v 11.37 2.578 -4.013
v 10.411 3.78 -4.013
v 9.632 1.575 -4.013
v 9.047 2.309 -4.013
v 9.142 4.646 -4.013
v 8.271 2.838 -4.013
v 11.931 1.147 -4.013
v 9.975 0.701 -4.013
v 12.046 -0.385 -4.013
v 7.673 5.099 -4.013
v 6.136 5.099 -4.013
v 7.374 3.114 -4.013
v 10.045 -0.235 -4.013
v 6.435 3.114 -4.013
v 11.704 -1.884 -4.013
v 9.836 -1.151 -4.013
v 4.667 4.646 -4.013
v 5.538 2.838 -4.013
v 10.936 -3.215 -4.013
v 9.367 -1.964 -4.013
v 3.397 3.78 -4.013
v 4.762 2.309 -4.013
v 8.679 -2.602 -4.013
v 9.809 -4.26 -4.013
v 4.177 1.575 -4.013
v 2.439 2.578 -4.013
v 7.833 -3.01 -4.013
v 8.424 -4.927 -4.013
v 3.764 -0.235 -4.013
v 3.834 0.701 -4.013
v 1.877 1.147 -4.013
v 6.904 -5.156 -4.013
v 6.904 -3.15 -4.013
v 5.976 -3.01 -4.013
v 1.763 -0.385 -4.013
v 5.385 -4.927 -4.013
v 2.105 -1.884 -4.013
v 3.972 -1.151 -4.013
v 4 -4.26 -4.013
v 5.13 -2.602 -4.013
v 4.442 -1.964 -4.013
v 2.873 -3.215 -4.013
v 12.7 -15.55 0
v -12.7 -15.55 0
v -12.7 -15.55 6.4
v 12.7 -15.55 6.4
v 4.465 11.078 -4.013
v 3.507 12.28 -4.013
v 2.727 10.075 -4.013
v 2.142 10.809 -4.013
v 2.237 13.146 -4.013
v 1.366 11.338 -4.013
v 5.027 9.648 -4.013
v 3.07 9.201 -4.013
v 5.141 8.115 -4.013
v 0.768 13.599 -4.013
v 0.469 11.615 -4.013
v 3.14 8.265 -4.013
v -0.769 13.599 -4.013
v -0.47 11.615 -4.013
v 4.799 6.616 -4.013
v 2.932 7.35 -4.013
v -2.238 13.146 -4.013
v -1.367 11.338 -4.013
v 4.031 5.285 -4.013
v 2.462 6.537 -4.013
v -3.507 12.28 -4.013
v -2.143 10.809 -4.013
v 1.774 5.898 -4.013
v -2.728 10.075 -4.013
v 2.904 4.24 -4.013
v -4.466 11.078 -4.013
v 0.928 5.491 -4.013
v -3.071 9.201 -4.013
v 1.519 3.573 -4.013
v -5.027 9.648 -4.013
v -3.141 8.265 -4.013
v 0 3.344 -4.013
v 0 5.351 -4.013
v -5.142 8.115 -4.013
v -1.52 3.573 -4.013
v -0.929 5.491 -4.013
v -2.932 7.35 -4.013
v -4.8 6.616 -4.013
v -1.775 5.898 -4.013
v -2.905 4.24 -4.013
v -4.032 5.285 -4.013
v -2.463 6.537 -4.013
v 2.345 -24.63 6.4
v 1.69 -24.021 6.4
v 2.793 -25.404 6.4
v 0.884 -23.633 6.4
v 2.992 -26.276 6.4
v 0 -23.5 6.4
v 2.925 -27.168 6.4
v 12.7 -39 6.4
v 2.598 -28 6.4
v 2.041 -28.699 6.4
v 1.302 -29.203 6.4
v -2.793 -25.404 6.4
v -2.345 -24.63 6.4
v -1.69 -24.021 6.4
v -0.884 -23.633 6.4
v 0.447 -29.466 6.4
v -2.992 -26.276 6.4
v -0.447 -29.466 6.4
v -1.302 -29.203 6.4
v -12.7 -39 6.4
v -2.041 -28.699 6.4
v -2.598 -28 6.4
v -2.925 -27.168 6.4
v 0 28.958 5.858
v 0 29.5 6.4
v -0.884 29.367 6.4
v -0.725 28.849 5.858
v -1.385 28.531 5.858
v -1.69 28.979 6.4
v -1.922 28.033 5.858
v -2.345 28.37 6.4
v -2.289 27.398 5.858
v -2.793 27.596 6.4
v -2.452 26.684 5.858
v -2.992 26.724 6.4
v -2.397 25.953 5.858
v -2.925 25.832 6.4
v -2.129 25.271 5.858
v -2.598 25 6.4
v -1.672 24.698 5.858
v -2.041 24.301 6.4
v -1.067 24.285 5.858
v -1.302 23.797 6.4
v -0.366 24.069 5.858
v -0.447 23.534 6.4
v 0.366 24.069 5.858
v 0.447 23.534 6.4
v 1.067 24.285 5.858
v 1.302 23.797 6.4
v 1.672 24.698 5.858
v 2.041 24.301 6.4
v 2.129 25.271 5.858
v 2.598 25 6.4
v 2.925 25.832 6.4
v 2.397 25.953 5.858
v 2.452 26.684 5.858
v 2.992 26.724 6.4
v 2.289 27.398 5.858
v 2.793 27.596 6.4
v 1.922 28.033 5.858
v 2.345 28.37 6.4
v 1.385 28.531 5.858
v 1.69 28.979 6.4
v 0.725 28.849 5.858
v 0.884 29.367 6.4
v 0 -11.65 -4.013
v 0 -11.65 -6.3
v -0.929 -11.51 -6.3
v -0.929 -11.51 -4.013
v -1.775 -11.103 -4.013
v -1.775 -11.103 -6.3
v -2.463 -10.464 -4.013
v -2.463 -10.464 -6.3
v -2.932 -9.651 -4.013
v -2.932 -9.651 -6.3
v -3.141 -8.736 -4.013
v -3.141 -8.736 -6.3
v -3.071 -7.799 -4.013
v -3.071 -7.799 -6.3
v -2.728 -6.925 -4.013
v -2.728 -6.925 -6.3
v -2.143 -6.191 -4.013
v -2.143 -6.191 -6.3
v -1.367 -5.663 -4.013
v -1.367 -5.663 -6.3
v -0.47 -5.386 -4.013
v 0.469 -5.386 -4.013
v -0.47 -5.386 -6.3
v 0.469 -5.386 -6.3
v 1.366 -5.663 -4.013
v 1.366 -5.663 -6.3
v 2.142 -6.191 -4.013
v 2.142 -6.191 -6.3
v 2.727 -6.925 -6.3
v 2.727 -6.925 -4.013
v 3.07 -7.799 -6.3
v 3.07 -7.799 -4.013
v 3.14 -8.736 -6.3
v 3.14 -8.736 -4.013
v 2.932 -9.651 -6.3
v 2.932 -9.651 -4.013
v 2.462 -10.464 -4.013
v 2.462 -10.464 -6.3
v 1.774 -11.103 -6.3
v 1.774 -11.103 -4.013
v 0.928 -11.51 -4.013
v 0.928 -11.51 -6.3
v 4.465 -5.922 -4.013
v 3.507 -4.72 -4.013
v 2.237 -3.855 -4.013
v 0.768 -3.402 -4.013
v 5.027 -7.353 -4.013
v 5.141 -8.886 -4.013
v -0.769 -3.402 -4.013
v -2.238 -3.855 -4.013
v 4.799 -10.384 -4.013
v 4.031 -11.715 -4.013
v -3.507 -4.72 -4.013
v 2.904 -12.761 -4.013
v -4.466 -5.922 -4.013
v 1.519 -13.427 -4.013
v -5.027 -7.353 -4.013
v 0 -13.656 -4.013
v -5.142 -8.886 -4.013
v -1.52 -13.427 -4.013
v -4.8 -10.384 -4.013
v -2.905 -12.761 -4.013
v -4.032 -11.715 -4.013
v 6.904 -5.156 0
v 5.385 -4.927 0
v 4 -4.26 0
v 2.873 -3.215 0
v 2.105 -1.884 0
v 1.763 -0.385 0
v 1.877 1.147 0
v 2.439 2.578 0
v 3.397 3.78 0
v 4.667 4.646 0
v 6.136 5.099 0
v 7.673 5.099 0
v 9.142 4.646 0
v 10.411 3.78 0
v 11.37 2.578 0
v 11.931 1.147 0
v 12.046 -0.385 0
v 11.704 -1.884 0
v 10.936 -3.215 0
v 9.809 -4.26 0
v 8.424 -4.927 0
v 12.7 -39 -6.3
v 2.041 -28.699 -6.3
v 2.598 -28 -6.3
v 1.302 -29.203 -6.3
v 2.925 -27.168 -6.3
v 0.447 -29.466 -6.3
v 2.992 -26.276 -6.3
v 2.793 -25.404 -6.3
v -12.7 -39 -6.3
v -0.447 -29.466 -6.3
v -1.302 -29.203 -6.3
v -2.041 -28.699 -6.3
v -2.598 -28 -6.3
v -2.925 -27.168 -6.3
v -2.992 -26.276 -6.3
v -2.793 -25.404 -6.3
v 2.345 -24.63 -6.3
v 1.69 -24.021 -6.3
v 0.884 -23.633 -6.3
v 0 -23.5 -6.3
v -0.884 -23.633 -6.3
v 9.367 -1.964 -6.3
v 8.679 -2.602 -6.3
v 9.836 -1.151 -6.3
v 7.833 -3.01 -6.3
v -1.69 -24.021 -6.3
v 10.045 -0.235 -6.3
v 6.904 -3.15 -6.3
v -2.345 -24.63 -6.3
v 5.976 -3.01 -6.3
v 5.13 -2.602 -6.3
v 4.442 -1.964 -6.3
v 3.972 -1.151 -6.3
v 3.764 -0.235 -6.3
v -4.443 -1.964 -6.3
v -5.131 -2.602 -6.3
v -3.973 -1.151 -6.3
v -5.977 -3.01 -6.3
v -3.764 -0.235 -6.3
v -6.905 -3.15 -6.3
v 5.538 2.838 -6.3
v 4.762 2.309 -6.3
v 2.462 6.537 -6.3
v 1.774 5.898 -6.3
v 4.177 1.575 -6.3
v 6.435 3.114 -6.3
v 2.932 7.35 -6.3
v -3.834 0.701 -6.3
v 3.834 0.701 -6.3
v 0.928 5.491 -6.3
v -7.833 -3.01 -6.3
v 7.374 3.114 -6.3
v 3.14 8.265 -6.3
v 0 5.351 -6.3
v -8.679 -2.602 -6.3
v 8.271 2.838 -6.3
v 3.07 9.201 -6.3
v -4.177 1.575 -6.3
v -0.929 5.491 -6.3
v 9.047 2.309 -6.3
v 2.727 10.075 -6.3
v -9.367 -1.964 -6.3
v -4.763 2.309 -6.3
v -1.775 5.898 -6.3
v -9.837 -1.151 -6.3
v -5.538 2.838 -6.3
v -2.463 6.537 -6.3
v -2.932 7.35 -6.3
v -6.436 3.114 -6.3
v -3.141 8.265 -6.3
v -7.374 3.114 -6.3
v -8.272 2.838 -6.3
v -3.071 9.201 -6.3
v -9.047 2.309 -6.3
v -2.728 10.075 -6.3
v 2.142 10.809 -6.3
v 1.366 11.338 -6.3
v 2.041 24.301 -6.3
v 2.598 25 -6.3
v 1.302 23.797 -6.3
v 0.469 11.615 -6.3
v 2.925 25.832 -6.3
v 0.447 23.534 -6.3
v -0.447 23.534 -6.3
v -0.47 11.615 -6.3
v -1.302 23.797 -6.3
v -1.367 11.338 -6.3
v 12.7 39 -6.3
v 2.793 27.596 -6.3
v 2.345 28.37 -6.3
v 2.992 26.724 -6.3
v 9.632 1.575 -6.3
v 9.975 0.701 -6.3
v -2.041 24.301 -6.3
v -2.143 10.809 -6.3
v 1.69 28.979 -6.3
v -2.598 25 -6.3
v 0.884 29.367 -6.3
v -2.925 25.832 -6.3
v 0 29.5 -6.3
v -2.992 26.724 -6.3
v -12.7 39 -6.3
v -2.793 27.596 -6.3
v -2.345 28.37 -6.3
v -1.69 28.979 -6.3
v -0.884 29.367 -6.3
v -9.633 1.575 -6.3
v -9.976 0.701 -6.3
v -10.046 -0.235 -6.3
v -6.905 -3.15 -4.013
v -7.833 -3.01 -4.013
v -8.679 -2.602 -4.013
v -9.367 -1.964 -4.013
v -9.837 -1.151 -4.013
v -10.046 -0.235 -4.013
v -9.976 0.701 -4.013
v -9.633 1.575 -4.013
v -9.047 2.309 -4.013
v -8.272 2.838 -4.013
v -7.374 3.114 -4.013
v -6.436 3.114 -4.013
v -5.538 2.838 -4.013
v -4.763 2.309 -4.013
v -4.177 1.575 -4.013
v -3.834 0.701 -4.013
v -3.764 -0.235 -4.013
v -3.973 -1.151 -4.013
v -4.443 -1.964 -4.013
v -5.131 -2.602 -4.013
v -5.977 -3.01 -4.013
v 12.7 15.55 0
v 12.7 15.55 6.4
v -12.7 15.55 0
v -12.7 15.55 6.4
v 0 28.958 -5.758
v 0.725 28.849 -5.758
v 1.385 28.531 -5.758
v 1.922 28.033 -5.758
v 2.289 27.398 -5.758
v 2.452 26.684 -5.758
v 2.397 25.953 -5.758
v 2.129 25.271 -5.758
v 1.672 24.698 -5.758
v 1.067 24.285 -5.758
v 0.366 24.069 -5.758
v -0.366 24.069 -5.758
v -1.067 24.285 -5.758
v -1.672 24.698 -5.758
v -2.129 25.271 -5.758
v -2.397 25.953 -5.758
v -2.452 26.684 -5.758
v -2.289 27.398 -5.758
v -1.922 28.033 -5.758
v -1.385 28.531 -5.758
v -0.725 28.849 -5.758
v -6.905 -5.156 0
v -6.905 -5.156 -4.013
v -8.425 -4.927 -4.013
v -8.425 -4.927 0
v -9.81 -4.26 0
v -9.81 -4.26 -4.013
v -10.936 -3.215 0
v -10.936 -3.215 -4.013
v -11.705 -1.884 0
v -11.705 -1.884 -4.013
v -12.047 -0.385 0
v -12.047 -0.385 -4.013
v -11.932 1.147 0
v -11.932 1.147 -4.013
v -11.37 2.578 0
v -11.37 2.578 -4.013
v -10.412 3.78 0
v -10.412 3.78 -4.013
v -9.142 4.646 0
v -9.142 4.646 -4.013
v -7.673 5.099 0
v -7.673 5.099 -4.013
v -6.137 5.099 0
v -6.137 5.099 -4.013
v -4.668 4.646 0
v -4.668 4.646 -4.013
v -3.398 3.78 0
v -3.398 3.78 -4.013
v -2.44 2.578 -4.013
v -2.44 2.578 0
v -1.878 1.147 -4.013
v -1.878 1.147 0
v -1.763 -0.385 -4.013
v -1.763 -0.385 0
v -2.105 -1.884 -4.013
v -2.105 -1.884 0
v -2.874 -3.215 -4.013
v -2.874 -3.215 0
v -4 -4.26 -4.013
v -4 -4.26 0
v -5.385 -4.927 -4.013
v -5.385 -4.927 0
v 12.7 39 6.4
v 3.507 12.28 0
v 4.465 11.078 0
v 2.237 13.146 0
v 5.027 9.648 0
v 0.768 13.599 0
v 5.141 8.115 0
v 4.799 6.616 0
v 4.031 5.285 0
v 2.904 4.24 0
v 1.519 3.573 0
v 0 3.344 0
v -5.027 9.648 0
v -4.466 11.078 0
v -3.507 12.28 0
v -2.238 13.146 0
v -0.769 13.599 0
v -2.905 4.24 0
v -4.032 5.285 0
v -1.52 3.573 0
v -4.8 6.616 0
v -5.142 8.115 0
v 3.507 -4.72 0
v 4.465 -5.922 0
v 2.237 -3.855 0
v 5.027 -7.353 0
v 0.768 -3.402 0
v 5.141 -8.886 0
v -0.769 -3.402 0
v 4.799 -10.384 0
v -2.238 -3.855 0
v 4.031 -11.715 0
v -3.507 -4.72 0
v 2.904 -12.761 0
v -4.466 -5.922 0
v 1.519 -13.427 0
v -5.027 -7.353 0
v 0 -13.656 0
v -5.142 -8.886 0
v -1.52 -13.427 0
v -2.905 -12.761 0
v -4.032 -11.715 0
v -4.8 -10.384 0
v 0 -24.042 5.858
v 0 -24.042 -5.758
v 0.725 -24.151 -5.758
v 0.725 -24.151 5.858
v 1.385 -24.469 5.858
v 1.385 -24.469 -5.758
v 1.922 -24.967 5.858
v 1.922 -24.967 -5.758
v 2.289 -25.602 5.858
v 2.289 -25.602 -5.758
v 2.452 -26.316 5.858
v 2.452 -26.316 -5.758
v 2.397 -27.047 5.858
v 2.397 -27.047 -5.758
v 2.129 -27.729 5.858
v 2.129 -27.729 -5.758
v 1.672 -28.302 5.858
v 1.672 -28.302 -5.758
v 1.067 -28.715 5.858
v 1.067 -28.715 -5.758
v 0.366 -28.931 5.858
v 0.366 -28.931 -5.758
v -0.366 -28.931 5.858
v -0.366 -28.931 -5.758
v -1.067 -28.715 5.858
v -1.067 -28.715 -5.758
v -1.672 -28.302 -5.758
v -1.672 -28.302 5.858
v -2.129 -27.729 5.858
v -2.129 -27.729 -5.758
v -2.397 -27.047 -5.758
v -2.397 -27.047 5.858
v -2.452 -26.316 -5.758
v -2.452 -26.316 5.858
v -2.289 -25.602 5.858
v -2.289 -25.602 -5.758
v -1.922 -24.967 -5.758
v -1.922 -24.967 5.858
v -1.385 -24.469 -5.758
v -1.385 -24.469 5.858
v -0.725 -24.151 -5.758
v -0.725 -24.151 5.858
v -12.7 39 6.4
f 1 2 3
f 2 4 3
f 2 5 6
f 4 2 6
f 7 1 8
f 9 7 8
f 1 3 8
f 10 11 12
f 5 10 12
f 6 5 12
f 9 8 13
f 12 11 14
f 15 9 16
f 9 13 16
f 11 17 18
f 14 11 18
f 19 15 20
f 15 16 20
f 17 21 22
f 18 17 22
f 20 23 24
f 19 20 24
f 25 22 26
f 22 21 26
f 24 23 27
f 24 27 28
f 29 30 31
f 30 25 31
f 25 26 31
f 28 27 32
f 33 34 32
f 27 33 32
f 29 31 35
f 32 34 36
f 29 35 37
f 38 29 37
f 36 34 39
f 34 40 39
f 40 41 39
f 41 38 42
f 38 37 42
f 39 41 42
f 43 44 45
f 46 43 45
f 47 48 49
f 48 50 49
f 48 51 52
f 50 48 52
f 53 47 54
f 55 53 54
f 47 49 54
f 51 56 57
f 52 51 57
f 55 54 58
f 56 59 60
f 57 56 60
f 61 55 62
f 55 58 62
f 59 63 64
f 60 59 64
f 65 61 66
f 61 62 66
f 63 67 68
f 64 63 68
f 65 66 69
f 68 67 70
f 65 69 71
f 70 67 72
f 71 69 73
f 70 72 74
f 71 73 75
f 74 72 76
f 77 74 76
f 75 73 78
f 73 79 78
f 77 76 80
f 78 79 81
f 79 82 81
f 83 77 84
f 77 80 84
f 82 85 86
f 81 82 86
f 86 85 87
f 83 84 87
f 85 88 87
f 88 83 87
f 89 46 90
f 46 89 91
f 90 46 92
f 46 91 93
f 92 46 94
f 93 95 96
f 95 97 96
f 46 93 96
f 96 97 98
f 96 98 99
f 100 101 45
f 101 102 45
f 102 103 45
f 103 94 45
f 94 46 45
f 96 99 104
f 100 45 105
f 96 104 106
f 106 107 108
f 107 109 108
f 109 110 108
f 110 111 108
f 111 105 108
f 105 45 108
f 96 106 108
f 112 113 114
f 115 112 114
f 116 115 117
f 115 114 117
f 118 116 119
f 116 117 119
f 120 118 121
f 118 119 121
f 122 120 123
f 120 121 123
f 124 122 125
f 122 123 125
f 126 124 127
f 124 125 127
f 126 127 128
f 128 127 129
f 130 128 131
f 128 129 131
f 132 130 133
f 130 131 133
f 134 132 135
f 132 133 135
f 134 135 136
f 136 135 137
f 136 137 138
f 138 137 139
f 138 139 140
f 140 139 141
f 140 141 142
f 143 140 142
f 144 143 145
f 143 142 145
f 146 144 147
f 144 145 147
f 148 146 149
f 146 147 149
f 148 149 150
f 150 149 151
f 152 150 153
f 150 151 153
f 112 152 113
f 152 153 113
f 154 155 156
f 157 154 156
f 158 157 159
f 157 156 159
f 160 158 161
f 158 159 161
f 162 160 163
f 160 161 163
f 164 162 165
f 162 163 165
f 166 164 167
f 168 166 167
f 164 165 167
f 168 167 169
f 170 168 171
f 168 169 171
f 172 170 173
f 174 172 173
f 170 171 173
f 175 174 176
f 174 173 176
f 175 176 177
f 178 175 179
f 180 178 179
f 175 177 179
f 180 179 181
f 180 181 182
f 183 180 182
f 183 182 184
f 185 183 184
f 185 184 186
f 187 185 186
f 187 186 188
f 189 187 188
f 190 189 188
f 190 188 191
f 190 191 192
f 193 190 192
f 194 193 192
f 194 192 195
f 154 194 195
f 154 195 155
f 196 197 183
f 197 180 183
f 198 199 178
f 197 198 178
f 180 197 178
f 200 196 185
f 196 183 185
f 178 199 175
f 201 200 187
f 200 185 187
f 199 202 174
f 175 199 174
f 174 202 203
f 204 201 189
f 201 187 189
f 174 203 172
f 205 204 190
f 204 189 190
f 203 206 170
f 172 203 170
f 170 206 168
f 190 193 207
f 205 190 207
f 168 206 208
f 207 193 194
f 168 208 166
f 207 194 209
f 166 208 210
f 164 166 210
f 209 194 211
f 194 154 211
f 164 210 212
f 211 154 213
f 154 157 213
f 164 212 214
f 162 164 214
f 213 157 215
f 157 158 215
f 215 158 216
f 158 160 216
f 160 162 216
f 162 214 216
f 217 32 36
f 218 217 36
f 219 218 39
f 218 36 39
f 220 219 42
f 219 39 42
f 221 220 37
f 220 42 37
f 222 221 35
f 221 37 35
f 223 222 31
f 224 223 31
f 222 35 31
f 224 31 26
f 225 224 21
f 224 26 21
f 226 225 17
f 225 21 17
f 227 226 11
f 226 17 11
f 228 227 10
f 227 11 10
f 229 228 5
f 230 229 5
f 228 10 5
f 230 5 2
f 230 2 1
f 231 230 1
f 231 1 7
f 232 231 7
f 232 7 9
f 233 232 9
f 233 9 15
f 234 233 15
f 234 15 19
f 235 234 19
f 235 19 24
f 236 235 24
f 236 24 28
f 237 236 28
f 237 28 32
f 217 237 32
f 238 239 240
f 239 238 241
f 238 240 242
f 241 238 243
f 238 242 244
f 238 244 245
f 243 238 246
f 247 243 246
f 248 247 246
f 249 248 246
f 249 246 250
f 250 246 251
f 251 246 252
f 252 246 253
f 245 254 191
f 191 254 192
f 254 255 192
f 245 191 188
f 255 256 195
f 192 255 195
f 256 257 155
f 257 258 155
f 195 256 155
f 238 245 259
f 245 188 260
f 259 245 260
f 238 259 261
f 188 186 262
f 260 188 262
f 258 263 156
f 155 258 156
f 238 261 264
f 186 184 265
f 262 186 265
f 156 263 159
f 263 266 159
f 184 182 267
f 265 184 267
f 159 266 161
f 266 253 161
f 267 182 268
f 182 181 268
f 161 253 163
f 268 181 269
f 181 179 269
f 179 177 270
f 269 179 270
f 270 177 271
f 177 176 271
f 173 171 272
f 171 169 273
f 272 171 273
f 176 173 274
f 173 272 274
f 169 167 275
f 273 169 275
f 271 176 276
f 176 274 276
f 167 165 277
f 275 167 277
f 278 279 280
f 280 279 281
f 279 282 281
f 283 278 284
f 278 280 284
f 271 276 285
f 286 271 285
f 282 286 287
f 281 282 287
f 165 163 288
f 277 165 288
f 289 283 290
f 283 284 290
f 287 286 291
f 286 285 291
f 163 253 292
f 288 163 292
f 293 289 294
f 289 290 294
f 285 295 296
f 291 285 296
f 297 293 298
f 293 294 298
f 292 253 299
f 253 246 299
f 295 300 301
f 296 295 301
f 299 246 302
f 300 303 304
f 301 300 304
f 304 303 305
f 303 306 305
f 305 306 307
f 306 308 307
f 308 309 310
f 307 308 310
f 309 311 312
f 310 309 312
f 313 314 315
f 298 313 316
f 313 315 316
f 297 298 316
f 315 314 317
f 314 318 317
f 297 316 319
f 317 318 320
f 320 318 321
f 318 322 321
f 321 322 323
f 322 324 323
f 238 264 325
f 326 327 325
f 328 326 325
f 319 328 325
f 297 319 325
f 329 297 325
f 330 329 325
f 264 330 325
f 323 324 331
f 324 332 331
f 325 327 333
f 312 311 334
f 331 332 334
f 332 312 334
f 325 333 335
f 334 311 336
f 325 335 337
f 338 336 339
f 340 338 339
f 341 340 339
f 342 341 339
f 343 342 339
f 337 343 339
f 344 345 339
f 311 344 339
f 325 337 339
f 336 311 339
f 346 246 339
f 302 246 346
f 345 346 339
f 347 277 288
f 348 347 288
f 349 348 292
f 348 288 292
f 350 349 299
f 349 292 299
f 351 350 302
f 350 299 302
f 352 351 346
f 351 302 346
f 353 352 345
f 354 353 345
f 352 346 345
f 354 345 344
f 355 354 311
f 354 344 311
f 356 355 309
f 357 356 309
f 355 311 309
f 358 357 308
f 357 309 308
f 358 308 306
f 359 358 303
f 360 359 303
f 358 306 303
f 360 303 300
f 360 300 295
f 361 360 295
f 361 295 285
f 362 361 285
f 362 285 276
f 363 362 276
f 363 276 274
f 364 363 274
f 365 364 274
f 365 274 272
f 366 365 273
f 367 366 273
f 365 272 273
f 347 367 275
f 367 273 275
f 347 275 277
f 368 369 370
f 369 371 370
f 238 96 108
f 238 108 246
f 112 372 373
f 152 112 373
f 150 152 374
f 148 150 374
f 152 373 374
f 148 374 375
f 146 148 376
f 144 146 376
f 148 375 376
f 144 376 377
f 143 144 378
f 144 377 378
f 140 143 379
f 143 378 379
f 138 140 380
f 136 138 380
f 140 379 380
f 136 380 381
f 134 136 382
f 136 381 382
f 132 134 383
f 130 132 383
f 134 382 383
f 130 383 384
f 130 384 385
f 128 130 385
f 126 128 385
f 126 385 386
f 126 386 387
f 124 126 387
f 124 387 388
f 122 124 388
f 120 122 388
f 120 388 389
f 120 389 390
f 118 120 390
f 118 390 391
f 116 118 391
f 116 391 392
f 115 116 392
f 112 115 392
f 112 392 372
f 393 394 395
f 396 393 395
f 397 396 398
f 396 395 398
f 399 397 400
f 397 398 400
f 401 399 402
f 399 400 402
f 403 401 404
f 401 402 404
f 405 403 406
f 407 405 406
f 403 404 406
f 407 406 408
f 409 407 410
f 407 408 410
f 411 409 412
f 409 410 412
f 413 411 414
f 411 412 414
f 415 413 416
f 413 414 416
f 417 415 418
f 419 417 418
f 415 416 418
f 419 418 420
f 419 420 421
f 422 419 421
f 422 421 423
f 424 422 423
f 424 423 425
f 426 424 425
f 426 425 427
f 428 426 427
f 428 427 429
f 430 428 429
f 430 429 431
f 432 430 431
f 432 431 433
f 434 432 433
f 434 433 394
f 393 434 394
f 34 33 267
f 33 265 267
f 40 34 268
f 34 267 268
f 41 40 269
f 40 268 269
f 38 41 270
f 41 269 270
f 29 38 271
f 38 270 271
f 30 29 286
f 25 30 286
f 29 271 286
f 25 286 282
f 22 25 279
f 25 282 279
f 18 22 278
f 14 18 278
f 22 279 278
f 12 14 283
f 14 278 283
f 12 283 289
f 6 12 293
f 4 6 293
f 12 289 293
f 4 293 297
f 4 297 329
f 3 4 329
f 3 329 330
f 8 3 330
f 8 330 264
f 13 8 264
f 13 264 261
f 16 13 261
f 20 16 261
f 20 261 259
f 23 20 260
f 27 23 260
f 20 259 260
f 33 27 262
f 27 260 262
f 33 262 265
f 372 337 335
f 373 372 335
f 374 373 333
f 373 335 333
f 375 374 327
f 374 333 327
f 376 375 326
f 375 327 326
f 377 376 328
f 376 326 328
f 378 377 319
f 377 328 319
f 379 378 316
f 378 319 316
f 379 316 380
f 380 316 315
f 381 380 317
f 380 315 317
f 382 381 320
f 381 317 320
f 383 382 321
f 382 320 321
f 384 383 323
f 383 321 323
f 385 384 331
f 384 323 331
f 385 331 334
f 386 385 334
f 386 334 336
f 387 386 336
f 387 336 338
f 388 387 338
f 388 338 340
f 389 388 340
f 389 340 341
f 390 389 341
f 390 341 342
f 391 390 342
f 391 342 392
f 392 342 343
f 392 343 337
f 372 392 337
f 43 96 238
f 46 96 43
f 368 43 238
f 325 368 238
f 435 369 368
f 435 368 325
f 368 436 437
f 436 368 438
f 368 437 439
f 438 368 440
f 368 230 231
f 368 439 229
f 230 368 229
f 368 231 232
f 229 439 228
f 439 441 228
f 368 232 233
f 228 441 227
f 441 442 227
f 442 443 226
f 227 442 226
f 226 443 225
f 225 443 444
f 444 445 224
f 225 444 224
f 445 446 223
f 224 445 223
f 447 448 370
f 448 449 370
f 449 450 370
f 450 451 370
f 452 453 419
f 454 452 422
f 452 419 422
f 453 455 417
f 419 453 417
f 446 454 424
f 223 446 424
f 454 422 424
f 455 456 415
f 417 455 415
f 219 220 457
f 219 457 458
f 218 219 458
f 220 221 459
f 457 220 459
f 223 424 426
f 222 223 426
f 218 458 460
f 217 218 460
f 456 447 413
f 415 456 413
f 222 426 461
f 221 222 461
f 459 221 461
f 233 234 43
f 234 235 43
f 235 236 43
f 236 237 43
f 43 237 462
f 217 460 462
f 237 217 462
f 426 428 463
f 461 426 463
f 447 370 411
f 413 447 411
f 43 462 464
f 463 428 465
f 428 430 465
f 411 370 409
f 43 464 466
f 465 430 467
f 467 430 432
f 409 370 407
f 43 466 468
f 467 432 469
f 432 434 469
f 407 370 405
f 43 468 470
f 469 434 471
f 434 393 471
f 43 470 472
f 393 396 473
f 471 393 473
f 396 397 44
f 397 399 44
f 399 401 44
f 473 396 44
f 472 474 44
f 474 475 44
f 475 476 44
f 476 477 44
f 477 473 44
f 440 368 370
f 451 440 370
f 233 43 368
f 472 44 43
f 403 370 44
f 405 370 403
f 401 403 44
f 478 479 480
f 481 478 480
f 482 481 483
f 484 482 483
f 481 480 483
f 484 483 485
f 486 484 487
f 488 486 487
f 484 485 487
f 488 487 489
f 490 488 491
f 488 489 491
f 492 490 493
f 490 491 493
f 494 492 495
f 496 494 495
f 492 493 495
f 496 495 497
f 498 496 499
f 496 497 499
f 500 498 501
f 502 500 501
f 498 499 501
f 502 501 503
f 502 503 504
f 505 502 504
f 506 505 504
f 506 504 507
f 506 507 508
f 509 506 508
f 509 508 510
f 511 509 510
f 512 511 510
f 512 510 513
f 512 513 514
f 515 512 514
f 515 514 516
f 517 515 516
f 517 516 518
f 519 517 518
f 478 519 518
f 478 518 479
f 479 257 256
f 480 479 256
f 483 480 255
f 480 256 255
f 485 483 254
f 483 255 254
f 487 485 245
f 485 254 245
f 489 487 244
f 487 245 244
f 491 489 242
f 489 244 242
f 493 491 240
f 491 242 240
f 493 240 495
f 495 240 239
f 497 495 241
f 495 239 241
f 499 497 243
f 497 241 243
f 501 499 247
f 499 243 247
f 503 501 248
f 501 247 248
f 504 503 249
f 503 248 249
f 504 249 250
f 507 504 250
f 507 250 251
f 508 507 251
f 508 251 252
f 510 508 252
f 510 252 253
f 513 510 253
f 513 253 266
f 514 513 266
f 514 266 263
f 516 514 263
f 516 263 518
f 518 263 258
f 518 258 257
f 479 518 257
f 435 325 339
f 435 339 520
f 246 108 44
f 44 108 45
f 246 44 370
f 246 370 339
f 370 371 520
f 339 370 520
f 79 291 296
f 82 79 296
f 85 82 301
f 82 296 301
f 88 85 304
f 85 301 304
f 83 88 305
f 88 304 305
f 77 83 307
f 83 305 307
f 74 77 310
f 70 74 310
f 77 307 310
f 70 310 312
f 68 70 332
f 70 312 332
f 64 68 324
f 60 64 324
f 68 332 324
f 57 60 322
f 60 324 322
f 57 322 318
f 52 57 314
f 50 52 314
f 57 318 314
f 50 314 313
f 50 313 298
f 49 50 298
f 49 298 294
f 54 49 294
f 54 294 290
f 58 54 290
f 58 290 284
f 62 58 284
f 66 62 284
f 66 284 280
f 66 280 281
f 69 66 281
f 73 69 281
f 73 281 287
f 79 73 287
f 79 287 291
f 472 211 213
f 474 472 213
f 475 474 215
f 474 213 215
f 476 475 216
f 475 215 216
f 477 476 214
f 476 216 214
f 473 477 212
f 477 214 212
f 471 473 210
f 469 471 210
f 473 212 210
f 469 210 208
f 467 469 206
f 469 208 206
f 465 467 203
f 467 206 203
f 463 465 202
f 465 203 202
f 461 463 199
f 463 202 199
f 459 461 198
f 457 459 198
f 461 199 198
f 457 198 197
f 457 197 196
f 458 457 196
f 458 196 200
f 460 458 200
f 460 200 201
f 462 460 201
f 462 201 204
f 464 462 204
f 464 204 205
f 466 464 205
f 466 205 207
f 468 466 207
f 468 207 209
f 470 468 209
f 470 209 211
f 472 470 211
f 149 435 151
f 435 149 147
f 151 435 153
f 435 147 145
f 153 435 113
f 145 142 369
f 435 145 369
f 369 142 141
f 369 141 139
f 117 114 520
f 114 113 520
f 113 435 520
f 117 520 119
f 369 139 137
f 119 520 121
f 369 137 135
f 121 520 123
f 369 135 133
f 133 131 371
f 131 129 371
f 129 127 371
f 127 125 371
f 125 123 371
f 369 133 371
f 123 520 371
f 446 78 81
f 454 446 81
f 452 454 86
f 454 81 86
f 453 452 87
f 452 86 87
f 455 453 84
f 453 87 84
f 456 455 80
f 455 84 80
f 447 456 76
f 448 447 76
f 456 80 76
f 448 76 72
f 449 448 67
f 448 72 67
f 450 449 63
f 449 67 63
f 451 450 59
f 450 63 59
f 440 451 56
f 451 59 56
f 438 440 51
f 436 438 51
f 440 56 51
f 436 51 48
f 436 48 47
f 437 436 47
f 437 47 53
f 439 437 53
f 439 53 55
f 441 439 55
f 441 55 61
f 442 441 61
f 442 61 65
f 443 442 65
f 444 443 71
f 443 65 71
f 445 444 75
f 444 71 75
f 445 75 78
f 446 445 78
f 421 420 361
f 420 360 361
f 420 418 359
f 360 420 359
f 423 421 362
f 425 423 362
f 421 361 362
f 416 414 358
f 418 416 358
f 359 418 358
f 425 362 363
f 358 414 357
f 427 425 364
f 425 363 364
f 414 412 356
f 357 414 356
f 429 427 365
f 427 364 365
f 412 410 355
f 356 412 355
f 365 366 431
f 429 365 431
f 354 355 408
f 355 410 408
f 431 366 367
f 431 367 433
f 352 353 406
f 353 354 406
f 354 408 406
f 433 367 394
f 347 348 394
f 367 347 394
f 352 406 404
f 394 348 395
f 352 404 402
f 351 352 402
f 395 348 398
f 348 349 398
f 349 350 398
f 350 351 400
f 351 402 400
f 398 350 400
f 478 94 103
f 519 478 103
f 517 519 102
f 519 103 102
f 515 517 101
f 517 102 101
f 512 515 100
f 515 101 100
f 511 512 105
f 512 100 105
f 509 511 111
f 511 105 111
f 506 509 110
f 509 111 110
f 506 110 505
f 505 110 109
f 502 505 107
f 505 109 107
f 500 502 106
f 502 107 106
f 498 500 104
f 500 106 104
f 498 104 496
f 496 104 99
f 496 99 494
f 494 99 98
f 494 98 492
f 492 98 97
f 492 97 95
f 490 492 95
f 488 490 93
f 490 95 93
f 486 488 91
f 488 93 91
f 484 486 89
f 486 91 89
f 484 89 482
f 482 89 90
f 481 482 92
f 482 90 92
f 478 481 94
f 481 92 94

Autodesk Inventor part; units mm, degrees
sketch "Sketch_1" plane through (0, 0, 0) normal (1, 0, 0) x (0, 1, 0)
  line L0 (-15.55, 6.4) -> (-39, 6.4)
  line L1 (-39, 6.4) -> (-39, -6.3)
  line L2 (-39, -6.3) -> (39, -6.3)
  line L3 (39, -6.3) -> (39, 6.4)
  line L4 (39, 6.4) -> (15.55, 6.4)
  line L5 (15.55, 6.4) -> (15.55, 0)
  line L6 (15.55, 0) -> (-15.55, 0)
  line L7 (-15.55, 0) -> (-15.55, 6.4)
extrude "Extrusion1" add sketch "Sketch_1" along normal mid plane 25.4
sketch "Sketch_2" plane through (0, 0, 0) normal (1, 0, 0) x (0, 1, 0)
  line L0 (26.5, -6.3) -> (26.5, 6.4)
  line L1 (26.5, 6.4) -> (29.5, 6.4)
  line L2 (29.5, 6.4) -> (28.9585, 5.8585)
  line L3 (28.9585, 5.8585) -> (28.9585, -5.7585)
  line L4 (28.9585, -5.7585) -> (29.5, -6.3)
  line L5 (29.5, -6.3) -> (26.5, -6.3)
  line L6 (26.5, -6.3) -> (26.5, 6.4)
revolve "Revolution1" cut sketch "Sketch_2" angle 360 about axis through (0, 26.5, -6.3) along (0, 0, -1)
thread "Thread1" size "M6x1" class "6H" standard "ISO Metric profile" full length
sketch "Sketch_3" plane through (0, 0, 0) normal (1, 0, 0) x (0, 1, 0)
  line L0 (-26.5, -6.3) -> (-26.5, 6.4)
  line L1 (-26.5, 6.4) -> (-23.5, 6.4)
  line L2 (-23.5, 6.4) -> (-24.0415, 5.8585)
  line L3 (-24.0415, 5.8585) -> (-24.0415, -5.7585)
  line L4 (-24.0415, -5.7585) -> (-23.5, -6.3)
  line L5 (-23.5, -6.3) -> (-26.5, -6.3)
  line L6 (-26.5, -6.3) -> (-26.5, 6.4)
revolve "Revolution2" cut sketch "Sketch_3" angle 360 about axis through (0, -26.5, -6.3) along (0, 0, -1)
thread "Thread2" size "M6x1" class "6H" standard "ISO Metric profile" full length
sketch "Sketch4" plane through (-12.7, -15.55, 0) normal (0, 0, 1) x (1, 0, 0)
  point P0 (5.795, 15.55)
hole "Hole1" at (-6.905, 0, 0) direction (0, 0, -1) diameter 6.2992 depth 6.3 counterbore diameter 10.3124 counterbore depth 4.0132
pattern_linear "Rectangular Pattern1" count 2 spacing 10.9512 along (0.6305, 0.7762, 0) count 2 spacing 10.9512 along (0.6305, -0.7762, 0) of "Hole1"
ref_plane "screw1_XY" through (-6.905, 0, -4.0132) normal (0, 0, 1) x (1, 0, 0)
ref_plane "screw1_YZ" through (-6.905, 0, -4.0132) normal (1, 0, 0) x (0, 1, 0)
ref_plane "screw1_ZX" through (-6.905, 0, -4.0132) normal (0, 1, 0) x (0, 0, 1)
ref_plane "screw1_1_XY" through (0, 8.5, -4.0132) normal (0, 0, 1) x (1, 0, 0)
ref_plane "screw1_1_YZ" through (0, 8.5, -4.0132) normal (1, 0, 0) x (0, 1, 0)
ref_plane "screw1_1_ZX" through (0, 8.5, -4.0132) normal (0, 1, 0) x (0, 0, 1)
ref_plane "screw2_XY" through (6.905, 0, -4.0132) normal (0, 0, 1) x (1, 0, 0)
ref_plane "screw2_YZ" through (6.905, 0, -4.0132) normal (1, 0, 0) x (0, 1, 0)
ref_plane "screw2_ZX" through (6.905, 0, -4.0132) normal (0, 1, 0) x (0, 0, 1)
ref_plane "screw2_1_XY" through (0, -8.5, -4.0132) normal (0, 0, 1) x (1, 0, 0)
ref_plane "screw2_1_YZ" through (0, -8.5, -4.0132) normal (1, 0, 0) x (0, 1, 0)
ref_plane "screw2_1_ZX" through (0, -8.5, -4.0132) normal (0, 1, 0) x (0, 0, 1)
ref_plane "to_dummy_XY" through (0, 0, 0) normal (0, 0, 1) x (1, 0, 0)
ref_plane "to_dummy_YZ" through (0, 0, 0) normal (1, 0, 0) x (0, 1, 0)
ref_plane "to_dummy_ZX" through (0, 0, 0) normal (0, 1, 0) x (0, 0, 1)
ref_plane "to_wheel1_XY" through (0, 26.5, 6.4) normal (0, 0, 1) x (1, 0, 0)
ref_plane "to_wheel1_YZ" through (0, 26.5, 6.4) normal (1, 0, 0) x (0, 1, 0)
ref_plane "to_wheel1_ZX" through (0, 26.5, 6.4) normal (0, 1, 0) x (0, 0, 1)
ref_plane "to_wheel2_XY" through (0, -26.5, 6.4) normal (0, 0, 1) x (1, 0, 0)
ref_plane "to_wheel2_YZ" through (0, -26.5, 6.4) normal (1, 0, 0) x (0, 1, 0)
ref_plane "to_wheel2_ZX" through (0, -26.5, 6.4) normal (0, 1, 0) x (0, 0, 1)
properties part number "25-2750-1_p"
